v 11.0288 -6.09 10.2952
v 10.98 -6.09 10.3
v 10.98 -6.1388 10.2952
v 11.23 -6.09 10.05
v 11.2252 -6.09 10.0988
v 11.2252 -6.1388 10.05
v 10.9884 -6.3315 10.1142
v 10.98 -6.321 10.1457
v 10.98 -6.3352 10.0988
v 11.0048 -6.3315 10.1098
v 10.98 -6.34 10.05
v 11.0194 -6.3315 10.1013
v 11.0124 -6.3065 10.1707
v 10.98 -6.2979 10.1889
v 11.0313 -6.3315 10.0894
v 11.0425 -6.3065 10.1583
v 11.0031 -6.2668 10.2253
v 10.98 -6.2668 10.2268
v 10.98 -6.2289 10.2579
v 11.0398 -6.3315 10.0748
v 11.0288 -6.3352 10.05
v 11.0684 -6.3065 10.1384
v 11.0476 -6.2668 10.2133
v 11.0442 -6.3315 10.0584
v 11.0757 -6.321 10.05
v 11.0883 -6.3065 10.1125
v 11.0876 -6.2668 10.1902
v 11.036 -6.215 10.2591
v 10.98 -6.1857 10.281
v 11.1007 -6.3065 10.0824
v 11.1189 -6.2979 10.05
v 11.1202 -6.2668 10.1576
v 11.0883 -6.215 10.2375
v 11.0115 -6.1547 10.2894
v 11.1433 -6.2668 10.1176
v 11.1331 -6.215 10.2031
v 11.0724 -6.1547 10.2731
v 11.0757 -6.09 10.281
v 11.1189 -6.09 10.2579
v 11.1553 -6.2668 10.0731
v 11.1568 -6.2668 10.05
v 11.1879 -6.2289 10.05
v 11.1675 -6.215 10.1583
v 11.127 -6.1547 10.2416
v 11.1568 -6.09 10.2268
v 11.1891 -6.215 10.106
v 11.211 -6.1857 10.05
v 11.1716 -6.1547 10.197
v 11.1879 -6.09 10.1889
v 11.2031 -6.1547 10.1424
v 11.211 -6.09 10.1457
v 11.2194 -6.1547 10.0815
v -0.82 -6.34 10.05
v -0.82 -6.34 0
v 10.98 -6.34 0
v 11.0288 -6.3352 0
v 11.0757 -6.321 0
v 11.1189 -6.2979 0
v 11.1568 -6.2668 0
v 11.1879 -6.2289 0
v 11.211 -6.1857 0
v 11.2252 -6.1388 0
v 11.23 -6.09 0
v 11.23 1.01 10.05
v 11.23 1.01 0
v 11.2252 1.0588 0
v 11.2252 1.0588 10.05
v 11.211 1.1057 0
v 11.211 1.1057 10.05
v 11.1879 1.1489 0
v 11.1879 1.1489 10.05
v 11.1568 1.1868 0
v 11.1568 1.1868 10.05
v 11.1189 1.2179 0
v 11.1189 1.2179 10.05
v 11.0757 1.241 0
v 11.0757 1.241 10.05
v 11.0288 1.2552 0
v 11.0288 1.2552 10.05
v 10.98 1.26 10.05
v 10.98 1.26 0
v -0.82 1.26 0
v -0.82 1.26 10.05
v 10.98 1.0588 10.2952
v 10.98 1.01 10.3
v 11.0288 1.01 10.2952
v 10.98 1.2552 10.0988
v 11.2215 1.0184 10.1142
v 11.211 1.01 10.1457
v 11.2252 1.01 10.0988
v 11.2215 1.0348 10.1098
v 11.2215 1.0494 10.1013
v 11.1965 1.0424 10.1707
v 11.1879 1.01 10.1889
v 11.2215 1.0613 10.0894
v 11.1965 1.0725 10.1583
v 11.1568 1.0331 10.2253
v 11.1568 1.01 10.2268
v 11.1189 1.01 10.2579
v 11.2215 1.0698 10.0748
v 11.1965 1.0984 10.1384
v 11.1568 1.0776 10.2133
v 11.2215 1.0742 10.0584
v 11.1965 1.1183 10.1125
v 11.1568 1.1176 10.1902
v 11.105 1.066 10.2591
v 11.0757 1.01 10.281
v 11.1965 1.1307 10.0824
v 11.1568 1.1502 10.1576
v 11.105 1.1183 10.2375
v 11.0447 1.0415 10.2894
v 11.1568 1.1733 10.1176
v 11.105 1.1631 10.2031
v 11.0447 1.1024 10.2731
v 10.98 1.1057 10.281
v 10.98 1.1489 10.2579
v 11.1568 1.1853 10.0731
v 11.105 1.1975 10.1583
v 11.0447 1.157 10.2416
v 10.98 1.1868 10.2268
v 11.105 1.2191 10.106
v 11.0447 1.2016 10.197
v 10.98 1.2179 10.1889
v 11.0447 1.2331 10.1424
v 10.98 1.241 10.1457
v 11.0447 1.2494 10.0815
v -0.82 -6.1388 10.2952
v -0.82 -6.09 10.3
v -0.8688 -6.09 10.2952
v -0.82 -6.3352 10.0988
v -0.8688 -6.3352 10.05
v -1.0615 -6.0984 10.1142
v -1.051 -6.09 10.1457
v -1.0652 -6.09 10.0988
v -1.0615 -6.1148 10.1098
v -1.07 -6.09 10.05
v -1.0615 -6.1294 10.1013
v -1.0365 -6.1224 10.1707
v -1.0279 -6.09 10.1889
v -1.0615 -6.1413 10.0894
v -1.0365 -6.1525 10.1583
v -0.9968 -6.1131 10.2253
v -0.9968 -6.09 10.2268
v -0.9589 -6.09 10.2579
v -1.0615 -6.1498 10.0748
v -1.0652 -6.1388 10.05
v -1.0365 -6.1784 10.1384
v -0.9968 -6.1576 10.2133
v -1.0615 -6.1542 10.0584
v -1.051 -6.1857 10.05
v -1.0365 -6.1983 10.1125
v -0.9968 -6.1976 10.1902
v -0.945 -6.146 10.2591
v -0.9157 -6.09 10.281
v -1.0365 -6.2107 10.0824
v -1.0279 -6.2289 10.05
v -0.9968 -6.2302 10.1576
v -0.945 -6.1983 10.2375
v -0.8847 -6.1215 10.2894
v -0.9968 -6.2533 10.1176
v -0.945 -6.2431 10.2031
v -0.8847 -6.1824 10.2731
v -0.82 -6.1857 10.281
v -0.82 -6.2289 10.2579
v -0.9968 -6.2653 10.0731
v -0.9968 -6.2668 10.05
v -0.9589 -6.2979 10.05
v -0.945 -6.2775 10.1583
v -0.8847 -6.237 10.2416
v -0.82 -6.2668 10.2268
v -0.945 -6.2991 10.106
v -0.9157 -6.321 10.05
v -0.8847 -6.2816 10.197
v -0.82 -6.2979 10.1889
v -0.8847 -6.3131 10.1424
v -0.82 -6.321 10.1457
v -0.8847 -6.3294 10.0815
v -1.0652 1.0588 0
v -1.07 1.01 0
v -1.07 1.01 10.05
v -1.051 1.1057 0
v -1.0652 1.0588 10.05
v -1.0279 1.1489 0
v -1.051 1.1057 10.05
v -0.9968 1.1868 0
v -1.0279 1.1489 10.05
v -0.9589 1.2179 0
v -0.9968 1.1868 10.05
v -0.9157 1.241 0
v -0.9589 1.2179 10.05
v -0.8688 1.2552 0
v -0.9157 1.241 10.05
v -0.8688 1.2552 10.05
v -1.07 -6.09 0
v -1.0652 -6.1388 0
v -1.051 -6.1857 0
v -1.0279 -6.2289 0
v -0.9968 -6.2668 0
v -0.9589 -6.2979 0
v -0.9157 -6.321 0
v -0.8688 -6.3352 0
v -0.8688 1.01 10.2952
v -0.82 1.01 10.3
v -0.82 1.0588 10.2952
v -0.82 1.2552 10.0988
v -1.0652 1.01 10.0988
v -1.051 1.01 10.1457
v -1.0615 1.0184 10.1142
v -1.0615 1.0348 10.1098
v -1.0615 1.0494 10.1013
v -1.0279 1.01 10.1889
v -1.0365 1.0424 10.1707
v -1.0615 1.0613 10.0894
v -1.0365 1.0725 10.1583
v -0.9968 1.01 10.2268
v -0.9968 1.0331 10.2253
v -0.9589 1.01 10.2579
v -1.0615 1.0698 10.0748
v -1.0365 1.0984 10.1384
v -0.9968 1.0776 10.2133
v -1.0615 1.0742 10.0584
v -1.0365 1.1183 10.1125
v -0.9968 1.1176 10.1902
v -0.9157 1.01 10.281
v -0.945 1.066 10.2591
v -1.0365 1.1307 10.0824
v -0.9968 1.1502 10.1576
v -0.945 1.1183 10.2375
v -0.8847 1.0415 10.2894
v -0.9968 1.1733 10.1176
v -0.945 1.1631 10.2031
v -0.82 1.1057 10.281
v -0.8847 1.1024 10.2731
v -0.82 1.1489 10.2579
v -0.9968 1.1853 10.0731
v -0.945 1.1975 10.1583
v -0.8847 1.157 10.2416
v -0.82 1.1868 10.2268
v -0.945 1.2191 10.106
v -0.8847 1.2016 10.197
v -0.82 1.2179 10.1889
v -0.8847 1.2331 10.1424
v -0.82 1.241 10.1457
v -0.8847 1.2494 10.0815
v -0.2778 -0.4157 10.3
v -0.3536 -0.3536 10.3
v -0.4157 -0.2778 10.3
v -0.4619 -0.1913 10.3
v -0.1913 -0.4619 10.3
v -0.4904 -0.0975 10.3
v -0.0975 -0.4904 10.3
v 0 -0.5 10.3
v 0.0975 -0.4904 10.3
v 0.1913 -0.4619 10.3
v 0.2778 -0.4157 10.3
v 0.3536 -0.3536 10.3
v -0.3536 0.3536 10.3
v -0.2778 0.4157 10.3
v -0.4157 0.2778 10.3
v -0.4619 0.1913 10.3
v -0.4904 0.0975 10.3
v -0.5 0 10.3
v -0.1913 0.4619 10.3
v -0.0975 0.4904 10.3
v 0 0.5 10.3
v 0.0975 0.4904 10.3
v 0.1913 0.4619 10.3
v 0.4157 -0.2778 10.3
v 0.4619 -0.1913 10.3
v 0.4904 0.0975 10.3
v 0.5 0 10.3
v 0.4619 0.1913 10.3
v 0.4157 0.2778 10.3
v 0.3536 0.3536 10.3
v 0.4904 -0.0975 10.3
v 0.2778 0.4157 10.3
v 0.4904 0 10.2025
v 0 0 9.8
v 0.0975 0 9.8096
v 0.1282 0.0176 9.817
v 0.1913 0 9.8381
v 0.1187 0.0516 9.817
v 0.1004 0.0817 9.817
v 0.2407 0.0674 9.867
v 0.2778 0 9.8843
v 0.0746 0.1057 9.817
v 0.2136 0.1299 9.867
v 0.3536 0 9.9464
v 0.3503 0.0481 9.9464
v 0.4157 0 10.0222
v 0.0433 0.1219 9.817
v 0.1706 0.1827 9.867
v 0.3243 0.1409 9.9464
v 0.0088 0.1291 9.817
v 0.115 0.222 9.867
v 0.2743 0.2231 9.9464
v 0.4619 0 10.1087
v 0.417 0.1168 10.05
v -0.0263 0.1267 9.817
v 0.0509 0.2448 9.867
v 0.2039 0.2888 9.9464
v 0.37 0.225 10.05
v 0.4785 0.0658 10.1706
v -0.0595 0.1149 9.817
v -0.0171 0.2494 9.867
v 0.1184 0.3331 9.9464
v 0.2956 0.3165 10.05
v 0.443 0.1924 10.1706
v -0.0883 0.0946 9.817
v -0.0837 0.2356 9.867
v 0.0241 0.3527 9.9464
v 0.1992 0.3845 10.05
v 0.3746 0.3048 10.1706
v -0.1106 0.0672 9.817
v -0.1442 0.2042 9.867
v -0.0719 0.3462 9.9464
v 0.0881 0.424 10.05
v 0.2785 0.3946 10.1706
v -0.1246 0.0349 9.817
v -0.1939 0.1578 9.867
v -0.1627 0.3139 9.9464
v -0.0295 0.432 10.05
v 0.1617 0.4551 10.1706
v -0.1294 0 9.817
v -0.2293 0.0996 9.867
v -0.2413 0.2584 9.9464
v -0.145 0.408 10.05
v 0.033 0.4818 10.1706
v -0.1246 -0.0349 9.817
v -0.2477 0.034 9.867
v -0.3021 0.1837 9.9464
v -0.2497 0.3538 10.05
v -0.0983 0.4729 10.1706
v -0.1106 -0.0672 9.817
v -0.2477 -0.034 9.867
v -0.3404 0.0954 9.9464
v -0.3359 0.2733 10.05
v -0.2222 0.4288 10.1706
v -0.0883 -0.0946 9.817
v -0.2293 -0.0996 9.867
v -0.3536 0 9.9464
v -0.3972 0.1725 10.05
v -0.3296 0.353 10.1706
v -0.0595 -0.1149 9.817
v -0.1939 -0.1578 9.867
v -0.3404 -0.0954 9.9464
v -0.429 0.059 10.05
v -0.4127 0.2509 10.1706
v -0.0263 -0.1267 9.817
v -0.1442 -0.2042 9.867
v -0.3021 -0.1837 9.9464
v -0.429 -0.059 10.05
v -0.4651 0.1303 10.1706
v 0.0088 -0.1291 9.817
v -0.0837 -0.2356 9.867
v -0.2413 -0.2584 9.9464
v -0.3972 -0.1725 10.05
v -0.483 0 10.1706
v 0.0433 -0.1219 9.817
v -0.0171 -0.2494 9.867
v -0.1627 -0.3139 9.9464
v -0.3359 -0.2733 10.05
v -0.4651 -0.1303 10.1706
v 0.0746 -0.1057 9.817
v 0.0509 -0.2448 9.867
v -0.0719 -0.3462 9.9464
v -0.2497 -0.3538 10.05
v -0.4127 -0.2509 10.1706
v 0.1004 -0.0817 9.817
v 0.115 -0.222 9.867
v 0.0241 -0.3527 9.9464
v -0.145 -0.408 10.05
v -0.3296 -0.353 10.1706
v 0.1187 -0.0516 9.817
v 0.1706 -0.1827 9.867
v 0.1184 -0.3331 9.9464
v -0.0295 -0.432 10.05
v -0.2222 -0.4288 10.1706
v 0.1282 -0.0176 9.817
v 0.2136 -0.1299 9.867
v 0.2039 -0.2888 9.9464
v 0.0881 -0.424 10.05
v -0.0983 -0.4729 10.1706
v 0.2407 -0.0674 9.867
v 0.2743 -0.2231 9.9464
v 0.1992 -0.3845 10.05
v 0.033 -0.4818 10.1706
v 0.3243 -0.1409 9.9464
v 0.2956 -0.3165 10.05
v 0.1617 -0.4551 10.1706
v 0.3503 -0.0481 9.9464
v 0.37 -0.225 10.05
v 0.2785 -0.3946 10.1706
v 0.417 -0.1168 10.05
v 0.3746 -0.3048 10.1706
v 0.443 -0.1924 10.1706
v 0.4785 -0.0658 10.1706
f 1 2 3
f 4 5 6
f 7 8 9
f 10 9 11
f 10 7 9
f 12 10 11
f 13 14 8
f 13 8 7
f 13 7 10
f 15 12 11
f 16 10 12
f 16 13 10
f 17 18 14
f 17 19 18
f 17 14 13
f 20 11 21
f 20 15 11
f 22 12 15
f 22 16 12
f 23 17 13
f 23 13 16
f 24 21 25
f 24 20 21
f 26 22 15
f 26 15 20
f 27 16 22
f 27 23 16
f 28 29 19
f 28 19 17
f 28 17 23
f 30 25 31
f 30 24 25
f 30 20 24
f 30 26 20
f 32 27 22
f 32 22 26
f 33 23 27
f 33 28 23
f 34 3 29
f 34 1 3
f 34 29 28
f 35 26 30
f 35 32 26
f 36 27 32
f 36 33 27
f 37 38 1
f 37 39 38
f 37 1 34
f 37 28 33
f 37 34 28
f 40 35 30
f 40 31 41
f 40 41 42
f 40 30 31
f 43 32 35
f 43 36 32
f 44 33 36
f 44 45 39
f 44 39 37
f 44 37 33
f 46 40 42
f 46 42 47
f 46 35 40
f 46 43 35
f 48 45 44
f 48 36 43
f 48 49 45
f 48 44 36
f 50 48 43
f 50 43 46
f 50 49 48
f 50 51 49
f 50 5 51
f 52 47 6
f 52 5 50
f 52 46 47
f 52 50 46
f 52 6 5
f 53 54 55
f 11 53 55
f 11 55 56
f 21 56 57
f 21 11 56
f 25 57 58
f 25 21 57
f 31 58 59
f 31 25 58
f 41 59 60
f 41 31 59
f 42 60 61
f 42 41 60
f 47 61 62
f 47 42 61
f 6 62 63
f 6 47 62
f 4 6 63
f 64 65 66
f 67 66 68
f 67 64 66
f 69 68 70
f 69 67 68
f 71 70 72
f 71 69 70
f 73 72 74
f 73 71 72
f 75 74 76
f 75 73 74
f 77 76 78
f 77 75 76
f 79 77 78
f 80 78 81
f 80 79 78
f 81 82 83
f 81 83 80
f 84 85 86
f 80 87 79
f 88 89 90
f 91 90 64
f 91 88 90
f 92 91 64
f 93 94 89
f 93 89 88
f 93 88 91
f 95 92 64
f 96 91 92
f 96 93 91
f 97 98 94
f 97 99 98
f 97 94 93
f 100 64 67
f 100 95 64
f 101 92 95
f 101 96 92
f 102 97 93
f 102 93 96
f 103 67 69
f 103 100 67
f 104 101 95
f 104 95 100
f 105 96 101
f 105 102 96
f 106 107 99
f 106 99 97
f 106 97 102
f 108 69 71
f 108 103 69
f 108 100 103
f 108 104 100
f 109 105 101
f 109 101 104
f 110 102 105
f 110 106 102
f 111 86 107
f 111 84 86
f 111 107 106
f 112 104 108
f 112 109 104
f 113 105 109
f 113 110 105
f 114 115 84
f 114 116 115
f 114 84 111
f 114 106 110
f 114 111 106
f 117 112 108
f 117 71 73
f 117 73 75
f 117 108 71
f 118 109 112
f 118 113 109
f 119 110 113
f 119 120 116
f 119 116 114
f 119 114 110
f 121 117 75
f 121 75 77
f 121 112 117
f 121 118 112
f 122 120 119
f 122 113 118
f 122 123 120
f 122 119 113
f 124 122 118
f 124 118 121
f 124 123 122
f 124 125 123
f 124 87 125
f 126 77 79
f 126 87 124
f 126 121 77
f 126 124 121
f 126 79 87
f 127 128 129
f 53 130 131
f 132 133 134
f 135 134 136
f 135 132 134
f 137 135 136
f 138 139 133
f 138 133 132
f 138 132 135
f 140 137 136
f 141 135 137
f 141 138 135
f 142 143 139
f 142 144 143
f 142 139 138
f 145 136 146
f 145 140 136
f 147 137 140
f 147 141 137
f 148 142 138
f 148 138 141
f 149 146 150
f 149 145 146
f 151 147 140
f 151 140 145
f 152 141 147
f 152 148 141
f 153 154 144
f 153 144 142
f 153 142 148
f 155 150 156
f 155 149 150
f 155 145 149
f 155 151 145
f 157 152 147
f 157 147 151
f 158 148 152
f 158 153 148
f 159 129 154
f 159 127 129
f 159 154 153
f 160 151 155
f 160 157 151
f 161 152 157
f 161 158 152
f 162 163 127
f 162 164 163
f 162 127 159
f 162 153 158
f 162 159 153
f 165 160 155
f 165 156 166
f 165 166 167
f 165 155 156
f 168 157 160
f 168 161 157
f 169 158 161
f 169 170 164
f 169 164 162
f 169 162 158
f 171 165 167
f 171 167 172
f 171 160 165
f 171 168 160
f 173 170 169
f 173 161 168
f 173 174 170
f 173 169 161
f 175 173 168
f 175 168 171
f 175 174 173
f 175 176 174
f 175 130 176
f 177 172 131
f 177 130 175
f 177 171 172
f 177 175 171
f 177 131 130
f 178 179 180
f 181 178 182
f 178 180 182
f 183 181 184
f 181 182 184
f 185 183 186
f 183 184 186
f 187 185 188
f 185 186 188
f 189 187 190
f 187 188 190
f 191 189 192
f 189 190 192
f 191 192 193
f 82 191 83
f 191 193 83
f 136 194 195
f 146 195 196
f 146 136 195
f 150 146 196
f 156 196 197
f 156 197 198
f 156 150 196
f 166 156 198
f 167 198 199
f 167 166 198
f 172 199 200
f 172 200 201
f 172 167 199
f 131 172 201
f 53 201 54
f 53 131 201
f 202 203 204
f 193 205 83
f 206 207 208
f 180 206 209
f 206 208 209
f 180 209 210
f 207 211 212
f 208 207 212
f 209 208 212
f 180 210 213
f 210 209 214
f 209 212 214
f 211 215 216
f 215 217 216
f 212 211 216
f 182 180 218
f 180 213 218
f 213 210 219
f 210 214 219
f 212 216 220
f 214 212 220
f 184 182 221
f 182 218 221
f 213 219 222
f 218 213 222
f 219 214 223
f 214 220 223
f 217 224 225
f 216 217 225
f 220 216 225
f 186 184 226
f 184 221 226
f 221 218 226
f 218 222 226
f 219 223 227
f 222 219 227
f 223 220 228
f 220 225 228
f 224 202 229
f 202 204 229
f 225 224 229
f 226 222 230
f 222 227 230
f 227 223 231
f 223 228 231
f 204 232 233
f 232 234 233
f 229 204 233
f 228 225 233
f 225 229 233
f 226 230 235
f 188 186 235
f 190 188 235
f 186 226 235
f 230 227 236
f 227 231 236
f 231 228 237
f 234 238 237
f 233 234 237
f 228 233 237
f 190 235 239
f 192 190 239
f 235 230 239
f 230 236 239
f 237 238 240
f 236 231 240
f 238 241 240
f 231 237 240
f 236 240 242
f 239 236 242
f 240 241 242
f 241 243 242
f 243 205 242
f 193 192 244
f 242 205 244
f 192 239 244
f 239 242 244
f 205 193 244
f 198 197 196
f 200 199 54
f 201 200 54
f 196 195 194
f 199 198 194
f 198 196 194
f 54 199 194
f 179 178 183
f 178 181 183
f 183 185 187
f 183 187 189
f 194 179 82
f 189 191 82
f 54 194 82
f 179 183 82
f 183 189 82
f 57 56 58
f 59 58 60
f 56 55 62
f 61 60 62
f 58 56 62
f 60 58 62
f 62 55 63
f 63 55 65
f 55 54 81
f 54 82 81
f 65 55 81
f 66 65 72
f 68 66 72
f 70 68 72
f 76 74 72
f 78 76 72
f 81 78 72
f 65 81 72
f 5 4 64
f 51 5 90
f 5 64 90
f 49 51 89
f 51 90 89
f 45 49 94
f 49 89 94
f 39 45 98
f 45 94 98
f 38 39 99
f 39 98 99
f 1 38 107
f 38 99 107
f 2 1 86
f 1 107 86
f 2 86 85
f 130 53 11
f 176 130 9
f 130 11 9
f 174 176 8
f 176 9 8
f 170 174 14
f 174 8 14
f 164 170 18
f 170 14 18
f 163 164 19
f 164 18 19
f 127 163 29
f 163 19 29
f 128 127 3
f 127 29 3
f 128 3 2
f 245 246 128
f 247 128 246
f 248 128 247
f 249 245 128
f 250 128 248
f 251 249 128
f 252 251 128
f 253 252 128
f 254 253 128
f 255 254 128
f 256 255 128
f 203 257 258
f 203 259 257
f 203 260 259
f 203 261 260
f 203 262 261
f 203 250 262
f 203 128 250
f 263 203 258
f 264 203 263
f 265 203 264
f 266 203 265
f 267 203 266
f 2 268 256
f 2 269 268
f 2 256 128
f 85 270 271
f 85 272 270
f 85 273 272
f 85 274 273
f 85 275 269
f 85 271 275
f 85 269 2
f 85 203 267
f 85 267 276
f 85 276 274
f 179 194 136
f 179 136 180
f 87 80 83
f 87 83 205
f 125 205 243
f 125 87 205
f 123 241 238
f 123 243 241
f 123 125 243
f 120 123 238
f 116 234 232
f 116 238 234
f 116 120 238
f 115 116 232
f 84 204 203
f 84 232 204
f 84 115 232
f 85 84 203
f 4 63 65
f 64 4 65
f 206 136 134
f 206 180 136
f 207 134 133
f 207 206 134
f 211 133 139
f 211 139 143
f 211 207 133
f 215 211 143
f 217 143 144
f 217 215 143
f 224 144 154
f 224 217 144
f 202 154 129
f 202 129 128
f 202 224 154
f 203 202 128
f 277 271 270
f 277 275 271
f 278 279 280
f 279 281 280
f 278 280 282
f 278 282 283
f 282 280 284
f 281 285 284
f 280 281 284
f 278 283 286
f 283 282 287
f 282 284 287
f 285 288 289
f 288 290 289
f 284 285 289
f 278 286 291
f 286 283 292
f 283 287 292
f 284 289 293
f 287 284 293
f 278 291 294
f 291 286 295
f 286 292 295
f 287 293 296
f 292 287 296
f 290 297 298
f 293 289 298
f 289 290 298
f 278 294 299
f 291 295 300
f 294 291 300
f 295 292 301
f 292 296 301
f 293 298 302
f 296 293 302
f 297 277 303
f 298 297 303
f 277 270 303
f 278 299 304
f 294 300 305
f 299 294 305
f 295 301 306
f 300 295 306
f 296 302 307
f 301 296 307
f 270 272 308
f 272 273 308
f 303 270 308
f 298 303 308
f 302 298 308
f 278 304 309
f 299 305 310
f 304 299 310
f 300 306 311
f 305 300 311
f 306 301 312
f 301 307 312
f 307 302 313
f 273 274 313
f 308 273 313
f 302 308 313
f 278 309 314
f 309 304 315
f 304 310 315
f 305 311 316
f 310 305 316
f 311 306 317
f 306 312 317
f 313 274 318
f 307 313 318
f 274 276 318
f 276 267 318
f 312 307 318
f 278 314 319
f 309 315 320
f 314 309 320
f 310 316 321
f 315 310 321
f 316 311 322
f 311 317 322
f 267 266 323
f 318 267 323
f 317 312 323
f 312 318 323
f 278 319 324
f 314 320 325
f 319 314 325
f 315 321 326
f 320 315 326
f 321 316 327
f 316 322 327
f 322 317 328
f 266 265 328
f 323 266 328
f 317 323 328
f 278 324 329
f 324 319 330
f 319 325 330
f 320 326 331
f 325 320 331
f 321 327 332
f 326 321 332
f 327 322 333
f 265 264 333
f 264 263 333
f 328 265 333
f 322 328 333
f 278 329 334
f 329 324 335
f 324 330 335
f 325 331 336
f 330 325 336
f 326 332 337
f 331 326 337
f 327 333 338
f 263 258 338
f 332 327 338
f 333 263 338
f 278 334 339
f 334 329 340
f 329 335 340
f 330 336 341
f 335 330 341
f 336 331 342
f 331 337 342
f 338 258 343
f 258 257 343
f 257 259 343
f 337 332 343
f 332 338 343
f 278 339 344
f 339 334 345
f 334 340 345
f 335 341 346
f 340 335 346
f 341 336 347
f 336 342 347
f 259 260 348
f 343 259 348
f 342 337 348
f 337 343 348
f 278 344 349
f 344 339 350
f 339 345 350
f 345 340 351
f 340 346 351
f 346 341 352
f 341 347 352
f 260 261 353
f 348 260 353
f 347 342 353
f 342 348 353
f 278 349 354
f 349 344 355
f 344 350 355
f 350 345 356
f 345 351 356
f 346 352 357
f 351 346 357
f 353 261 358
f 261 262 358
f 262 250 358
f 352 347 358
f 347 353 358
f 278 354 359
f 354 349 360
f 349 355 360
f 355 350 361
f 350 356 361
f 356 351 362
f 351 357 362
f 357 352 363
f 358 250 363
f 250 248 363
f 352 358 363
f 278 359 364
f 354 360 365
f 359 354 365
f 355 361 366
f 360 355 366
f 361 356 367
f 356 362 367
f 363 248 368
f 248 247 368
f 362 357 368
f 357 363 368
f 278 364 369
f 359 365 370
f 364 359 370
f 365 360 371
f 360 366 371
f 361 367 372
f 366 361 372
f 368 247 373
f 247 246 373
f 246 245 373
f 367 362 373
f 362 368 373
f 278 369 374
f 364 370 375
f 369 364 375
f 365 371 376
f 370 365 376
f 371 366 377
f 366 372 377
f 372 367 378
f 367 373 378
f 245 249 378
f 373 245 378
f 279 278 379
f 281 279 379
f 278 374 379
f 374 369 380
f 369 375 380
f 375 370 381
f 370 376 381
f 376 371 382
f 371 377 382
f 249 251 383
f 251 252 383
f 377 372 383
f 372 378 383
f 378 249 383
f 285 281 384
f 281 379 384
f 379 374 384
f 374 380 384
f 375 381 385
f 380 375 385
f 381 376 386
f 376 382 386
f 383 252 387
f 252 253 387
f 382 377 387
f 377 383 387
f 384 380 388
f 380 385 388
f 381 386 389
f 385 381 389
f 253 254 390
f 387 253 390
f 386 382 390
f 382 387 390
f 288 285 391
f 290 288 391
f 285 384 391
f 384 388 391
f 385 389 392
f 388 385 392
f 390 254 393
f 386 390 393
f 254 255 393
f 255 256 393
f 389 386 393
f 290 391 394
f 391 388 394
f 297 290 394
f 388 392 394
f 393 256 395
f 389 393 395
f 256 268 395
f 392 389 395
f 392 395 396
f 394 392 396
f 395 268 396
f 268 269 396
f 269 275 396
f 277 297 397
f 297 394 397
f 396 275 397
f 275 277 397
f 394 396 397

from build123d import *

# Parameters (mm, degrees)
SKETCH_W  = 12.3
SKETCH_H  = 7.6
PAD_DEPTH = 10.3
FILLET_R  = 0.25


with BuildPart() as part:
    # Sketch → Pad (new body)
    with BuildSketch(Plane.XY):
        with Locations((5.08, -2.54)):
            Rectangle(SKETCH_W, SKETCH_H)
    extrude(amount=PAD_DEPTH)

    # Fillet
    fillet_edges = [part.edges().sort_by_distance(p)[0] for p in [
        (5.08, 1.26, 10.3),
        (11.23, -2.54, 10.3),
        (5.08, -6.34, 10.3),
        (-1.07, -2.54, 10.3),
        (11.23, 1.26, 5.15),
        (-1.07, 1.26, 5.15),
        (11.23, -6.34, 5.15),
        (-1.07, -6.34, 5.15),
    ]]
    fillet(fillet_edges, radius=FILLET_R)

    # Sphere → Sphere (revolve, cut)
    with BuildSketch(Plane(origin=(0, 0, 10.3), x_dir=(1, 0, 0), z_dir=(0, -1, 0))):
        with BuildLine():
            ThreePointArc((0, -0.5), (0.5, 0), (0, 0.5))
            Line((0, 0.5), (0, -0.5))
        make_face()
    revolve(axis=Axis((0, 0, 10.3), (0, 0, 1)), mode=Mode.SUBTRACT)


solid = part.part
